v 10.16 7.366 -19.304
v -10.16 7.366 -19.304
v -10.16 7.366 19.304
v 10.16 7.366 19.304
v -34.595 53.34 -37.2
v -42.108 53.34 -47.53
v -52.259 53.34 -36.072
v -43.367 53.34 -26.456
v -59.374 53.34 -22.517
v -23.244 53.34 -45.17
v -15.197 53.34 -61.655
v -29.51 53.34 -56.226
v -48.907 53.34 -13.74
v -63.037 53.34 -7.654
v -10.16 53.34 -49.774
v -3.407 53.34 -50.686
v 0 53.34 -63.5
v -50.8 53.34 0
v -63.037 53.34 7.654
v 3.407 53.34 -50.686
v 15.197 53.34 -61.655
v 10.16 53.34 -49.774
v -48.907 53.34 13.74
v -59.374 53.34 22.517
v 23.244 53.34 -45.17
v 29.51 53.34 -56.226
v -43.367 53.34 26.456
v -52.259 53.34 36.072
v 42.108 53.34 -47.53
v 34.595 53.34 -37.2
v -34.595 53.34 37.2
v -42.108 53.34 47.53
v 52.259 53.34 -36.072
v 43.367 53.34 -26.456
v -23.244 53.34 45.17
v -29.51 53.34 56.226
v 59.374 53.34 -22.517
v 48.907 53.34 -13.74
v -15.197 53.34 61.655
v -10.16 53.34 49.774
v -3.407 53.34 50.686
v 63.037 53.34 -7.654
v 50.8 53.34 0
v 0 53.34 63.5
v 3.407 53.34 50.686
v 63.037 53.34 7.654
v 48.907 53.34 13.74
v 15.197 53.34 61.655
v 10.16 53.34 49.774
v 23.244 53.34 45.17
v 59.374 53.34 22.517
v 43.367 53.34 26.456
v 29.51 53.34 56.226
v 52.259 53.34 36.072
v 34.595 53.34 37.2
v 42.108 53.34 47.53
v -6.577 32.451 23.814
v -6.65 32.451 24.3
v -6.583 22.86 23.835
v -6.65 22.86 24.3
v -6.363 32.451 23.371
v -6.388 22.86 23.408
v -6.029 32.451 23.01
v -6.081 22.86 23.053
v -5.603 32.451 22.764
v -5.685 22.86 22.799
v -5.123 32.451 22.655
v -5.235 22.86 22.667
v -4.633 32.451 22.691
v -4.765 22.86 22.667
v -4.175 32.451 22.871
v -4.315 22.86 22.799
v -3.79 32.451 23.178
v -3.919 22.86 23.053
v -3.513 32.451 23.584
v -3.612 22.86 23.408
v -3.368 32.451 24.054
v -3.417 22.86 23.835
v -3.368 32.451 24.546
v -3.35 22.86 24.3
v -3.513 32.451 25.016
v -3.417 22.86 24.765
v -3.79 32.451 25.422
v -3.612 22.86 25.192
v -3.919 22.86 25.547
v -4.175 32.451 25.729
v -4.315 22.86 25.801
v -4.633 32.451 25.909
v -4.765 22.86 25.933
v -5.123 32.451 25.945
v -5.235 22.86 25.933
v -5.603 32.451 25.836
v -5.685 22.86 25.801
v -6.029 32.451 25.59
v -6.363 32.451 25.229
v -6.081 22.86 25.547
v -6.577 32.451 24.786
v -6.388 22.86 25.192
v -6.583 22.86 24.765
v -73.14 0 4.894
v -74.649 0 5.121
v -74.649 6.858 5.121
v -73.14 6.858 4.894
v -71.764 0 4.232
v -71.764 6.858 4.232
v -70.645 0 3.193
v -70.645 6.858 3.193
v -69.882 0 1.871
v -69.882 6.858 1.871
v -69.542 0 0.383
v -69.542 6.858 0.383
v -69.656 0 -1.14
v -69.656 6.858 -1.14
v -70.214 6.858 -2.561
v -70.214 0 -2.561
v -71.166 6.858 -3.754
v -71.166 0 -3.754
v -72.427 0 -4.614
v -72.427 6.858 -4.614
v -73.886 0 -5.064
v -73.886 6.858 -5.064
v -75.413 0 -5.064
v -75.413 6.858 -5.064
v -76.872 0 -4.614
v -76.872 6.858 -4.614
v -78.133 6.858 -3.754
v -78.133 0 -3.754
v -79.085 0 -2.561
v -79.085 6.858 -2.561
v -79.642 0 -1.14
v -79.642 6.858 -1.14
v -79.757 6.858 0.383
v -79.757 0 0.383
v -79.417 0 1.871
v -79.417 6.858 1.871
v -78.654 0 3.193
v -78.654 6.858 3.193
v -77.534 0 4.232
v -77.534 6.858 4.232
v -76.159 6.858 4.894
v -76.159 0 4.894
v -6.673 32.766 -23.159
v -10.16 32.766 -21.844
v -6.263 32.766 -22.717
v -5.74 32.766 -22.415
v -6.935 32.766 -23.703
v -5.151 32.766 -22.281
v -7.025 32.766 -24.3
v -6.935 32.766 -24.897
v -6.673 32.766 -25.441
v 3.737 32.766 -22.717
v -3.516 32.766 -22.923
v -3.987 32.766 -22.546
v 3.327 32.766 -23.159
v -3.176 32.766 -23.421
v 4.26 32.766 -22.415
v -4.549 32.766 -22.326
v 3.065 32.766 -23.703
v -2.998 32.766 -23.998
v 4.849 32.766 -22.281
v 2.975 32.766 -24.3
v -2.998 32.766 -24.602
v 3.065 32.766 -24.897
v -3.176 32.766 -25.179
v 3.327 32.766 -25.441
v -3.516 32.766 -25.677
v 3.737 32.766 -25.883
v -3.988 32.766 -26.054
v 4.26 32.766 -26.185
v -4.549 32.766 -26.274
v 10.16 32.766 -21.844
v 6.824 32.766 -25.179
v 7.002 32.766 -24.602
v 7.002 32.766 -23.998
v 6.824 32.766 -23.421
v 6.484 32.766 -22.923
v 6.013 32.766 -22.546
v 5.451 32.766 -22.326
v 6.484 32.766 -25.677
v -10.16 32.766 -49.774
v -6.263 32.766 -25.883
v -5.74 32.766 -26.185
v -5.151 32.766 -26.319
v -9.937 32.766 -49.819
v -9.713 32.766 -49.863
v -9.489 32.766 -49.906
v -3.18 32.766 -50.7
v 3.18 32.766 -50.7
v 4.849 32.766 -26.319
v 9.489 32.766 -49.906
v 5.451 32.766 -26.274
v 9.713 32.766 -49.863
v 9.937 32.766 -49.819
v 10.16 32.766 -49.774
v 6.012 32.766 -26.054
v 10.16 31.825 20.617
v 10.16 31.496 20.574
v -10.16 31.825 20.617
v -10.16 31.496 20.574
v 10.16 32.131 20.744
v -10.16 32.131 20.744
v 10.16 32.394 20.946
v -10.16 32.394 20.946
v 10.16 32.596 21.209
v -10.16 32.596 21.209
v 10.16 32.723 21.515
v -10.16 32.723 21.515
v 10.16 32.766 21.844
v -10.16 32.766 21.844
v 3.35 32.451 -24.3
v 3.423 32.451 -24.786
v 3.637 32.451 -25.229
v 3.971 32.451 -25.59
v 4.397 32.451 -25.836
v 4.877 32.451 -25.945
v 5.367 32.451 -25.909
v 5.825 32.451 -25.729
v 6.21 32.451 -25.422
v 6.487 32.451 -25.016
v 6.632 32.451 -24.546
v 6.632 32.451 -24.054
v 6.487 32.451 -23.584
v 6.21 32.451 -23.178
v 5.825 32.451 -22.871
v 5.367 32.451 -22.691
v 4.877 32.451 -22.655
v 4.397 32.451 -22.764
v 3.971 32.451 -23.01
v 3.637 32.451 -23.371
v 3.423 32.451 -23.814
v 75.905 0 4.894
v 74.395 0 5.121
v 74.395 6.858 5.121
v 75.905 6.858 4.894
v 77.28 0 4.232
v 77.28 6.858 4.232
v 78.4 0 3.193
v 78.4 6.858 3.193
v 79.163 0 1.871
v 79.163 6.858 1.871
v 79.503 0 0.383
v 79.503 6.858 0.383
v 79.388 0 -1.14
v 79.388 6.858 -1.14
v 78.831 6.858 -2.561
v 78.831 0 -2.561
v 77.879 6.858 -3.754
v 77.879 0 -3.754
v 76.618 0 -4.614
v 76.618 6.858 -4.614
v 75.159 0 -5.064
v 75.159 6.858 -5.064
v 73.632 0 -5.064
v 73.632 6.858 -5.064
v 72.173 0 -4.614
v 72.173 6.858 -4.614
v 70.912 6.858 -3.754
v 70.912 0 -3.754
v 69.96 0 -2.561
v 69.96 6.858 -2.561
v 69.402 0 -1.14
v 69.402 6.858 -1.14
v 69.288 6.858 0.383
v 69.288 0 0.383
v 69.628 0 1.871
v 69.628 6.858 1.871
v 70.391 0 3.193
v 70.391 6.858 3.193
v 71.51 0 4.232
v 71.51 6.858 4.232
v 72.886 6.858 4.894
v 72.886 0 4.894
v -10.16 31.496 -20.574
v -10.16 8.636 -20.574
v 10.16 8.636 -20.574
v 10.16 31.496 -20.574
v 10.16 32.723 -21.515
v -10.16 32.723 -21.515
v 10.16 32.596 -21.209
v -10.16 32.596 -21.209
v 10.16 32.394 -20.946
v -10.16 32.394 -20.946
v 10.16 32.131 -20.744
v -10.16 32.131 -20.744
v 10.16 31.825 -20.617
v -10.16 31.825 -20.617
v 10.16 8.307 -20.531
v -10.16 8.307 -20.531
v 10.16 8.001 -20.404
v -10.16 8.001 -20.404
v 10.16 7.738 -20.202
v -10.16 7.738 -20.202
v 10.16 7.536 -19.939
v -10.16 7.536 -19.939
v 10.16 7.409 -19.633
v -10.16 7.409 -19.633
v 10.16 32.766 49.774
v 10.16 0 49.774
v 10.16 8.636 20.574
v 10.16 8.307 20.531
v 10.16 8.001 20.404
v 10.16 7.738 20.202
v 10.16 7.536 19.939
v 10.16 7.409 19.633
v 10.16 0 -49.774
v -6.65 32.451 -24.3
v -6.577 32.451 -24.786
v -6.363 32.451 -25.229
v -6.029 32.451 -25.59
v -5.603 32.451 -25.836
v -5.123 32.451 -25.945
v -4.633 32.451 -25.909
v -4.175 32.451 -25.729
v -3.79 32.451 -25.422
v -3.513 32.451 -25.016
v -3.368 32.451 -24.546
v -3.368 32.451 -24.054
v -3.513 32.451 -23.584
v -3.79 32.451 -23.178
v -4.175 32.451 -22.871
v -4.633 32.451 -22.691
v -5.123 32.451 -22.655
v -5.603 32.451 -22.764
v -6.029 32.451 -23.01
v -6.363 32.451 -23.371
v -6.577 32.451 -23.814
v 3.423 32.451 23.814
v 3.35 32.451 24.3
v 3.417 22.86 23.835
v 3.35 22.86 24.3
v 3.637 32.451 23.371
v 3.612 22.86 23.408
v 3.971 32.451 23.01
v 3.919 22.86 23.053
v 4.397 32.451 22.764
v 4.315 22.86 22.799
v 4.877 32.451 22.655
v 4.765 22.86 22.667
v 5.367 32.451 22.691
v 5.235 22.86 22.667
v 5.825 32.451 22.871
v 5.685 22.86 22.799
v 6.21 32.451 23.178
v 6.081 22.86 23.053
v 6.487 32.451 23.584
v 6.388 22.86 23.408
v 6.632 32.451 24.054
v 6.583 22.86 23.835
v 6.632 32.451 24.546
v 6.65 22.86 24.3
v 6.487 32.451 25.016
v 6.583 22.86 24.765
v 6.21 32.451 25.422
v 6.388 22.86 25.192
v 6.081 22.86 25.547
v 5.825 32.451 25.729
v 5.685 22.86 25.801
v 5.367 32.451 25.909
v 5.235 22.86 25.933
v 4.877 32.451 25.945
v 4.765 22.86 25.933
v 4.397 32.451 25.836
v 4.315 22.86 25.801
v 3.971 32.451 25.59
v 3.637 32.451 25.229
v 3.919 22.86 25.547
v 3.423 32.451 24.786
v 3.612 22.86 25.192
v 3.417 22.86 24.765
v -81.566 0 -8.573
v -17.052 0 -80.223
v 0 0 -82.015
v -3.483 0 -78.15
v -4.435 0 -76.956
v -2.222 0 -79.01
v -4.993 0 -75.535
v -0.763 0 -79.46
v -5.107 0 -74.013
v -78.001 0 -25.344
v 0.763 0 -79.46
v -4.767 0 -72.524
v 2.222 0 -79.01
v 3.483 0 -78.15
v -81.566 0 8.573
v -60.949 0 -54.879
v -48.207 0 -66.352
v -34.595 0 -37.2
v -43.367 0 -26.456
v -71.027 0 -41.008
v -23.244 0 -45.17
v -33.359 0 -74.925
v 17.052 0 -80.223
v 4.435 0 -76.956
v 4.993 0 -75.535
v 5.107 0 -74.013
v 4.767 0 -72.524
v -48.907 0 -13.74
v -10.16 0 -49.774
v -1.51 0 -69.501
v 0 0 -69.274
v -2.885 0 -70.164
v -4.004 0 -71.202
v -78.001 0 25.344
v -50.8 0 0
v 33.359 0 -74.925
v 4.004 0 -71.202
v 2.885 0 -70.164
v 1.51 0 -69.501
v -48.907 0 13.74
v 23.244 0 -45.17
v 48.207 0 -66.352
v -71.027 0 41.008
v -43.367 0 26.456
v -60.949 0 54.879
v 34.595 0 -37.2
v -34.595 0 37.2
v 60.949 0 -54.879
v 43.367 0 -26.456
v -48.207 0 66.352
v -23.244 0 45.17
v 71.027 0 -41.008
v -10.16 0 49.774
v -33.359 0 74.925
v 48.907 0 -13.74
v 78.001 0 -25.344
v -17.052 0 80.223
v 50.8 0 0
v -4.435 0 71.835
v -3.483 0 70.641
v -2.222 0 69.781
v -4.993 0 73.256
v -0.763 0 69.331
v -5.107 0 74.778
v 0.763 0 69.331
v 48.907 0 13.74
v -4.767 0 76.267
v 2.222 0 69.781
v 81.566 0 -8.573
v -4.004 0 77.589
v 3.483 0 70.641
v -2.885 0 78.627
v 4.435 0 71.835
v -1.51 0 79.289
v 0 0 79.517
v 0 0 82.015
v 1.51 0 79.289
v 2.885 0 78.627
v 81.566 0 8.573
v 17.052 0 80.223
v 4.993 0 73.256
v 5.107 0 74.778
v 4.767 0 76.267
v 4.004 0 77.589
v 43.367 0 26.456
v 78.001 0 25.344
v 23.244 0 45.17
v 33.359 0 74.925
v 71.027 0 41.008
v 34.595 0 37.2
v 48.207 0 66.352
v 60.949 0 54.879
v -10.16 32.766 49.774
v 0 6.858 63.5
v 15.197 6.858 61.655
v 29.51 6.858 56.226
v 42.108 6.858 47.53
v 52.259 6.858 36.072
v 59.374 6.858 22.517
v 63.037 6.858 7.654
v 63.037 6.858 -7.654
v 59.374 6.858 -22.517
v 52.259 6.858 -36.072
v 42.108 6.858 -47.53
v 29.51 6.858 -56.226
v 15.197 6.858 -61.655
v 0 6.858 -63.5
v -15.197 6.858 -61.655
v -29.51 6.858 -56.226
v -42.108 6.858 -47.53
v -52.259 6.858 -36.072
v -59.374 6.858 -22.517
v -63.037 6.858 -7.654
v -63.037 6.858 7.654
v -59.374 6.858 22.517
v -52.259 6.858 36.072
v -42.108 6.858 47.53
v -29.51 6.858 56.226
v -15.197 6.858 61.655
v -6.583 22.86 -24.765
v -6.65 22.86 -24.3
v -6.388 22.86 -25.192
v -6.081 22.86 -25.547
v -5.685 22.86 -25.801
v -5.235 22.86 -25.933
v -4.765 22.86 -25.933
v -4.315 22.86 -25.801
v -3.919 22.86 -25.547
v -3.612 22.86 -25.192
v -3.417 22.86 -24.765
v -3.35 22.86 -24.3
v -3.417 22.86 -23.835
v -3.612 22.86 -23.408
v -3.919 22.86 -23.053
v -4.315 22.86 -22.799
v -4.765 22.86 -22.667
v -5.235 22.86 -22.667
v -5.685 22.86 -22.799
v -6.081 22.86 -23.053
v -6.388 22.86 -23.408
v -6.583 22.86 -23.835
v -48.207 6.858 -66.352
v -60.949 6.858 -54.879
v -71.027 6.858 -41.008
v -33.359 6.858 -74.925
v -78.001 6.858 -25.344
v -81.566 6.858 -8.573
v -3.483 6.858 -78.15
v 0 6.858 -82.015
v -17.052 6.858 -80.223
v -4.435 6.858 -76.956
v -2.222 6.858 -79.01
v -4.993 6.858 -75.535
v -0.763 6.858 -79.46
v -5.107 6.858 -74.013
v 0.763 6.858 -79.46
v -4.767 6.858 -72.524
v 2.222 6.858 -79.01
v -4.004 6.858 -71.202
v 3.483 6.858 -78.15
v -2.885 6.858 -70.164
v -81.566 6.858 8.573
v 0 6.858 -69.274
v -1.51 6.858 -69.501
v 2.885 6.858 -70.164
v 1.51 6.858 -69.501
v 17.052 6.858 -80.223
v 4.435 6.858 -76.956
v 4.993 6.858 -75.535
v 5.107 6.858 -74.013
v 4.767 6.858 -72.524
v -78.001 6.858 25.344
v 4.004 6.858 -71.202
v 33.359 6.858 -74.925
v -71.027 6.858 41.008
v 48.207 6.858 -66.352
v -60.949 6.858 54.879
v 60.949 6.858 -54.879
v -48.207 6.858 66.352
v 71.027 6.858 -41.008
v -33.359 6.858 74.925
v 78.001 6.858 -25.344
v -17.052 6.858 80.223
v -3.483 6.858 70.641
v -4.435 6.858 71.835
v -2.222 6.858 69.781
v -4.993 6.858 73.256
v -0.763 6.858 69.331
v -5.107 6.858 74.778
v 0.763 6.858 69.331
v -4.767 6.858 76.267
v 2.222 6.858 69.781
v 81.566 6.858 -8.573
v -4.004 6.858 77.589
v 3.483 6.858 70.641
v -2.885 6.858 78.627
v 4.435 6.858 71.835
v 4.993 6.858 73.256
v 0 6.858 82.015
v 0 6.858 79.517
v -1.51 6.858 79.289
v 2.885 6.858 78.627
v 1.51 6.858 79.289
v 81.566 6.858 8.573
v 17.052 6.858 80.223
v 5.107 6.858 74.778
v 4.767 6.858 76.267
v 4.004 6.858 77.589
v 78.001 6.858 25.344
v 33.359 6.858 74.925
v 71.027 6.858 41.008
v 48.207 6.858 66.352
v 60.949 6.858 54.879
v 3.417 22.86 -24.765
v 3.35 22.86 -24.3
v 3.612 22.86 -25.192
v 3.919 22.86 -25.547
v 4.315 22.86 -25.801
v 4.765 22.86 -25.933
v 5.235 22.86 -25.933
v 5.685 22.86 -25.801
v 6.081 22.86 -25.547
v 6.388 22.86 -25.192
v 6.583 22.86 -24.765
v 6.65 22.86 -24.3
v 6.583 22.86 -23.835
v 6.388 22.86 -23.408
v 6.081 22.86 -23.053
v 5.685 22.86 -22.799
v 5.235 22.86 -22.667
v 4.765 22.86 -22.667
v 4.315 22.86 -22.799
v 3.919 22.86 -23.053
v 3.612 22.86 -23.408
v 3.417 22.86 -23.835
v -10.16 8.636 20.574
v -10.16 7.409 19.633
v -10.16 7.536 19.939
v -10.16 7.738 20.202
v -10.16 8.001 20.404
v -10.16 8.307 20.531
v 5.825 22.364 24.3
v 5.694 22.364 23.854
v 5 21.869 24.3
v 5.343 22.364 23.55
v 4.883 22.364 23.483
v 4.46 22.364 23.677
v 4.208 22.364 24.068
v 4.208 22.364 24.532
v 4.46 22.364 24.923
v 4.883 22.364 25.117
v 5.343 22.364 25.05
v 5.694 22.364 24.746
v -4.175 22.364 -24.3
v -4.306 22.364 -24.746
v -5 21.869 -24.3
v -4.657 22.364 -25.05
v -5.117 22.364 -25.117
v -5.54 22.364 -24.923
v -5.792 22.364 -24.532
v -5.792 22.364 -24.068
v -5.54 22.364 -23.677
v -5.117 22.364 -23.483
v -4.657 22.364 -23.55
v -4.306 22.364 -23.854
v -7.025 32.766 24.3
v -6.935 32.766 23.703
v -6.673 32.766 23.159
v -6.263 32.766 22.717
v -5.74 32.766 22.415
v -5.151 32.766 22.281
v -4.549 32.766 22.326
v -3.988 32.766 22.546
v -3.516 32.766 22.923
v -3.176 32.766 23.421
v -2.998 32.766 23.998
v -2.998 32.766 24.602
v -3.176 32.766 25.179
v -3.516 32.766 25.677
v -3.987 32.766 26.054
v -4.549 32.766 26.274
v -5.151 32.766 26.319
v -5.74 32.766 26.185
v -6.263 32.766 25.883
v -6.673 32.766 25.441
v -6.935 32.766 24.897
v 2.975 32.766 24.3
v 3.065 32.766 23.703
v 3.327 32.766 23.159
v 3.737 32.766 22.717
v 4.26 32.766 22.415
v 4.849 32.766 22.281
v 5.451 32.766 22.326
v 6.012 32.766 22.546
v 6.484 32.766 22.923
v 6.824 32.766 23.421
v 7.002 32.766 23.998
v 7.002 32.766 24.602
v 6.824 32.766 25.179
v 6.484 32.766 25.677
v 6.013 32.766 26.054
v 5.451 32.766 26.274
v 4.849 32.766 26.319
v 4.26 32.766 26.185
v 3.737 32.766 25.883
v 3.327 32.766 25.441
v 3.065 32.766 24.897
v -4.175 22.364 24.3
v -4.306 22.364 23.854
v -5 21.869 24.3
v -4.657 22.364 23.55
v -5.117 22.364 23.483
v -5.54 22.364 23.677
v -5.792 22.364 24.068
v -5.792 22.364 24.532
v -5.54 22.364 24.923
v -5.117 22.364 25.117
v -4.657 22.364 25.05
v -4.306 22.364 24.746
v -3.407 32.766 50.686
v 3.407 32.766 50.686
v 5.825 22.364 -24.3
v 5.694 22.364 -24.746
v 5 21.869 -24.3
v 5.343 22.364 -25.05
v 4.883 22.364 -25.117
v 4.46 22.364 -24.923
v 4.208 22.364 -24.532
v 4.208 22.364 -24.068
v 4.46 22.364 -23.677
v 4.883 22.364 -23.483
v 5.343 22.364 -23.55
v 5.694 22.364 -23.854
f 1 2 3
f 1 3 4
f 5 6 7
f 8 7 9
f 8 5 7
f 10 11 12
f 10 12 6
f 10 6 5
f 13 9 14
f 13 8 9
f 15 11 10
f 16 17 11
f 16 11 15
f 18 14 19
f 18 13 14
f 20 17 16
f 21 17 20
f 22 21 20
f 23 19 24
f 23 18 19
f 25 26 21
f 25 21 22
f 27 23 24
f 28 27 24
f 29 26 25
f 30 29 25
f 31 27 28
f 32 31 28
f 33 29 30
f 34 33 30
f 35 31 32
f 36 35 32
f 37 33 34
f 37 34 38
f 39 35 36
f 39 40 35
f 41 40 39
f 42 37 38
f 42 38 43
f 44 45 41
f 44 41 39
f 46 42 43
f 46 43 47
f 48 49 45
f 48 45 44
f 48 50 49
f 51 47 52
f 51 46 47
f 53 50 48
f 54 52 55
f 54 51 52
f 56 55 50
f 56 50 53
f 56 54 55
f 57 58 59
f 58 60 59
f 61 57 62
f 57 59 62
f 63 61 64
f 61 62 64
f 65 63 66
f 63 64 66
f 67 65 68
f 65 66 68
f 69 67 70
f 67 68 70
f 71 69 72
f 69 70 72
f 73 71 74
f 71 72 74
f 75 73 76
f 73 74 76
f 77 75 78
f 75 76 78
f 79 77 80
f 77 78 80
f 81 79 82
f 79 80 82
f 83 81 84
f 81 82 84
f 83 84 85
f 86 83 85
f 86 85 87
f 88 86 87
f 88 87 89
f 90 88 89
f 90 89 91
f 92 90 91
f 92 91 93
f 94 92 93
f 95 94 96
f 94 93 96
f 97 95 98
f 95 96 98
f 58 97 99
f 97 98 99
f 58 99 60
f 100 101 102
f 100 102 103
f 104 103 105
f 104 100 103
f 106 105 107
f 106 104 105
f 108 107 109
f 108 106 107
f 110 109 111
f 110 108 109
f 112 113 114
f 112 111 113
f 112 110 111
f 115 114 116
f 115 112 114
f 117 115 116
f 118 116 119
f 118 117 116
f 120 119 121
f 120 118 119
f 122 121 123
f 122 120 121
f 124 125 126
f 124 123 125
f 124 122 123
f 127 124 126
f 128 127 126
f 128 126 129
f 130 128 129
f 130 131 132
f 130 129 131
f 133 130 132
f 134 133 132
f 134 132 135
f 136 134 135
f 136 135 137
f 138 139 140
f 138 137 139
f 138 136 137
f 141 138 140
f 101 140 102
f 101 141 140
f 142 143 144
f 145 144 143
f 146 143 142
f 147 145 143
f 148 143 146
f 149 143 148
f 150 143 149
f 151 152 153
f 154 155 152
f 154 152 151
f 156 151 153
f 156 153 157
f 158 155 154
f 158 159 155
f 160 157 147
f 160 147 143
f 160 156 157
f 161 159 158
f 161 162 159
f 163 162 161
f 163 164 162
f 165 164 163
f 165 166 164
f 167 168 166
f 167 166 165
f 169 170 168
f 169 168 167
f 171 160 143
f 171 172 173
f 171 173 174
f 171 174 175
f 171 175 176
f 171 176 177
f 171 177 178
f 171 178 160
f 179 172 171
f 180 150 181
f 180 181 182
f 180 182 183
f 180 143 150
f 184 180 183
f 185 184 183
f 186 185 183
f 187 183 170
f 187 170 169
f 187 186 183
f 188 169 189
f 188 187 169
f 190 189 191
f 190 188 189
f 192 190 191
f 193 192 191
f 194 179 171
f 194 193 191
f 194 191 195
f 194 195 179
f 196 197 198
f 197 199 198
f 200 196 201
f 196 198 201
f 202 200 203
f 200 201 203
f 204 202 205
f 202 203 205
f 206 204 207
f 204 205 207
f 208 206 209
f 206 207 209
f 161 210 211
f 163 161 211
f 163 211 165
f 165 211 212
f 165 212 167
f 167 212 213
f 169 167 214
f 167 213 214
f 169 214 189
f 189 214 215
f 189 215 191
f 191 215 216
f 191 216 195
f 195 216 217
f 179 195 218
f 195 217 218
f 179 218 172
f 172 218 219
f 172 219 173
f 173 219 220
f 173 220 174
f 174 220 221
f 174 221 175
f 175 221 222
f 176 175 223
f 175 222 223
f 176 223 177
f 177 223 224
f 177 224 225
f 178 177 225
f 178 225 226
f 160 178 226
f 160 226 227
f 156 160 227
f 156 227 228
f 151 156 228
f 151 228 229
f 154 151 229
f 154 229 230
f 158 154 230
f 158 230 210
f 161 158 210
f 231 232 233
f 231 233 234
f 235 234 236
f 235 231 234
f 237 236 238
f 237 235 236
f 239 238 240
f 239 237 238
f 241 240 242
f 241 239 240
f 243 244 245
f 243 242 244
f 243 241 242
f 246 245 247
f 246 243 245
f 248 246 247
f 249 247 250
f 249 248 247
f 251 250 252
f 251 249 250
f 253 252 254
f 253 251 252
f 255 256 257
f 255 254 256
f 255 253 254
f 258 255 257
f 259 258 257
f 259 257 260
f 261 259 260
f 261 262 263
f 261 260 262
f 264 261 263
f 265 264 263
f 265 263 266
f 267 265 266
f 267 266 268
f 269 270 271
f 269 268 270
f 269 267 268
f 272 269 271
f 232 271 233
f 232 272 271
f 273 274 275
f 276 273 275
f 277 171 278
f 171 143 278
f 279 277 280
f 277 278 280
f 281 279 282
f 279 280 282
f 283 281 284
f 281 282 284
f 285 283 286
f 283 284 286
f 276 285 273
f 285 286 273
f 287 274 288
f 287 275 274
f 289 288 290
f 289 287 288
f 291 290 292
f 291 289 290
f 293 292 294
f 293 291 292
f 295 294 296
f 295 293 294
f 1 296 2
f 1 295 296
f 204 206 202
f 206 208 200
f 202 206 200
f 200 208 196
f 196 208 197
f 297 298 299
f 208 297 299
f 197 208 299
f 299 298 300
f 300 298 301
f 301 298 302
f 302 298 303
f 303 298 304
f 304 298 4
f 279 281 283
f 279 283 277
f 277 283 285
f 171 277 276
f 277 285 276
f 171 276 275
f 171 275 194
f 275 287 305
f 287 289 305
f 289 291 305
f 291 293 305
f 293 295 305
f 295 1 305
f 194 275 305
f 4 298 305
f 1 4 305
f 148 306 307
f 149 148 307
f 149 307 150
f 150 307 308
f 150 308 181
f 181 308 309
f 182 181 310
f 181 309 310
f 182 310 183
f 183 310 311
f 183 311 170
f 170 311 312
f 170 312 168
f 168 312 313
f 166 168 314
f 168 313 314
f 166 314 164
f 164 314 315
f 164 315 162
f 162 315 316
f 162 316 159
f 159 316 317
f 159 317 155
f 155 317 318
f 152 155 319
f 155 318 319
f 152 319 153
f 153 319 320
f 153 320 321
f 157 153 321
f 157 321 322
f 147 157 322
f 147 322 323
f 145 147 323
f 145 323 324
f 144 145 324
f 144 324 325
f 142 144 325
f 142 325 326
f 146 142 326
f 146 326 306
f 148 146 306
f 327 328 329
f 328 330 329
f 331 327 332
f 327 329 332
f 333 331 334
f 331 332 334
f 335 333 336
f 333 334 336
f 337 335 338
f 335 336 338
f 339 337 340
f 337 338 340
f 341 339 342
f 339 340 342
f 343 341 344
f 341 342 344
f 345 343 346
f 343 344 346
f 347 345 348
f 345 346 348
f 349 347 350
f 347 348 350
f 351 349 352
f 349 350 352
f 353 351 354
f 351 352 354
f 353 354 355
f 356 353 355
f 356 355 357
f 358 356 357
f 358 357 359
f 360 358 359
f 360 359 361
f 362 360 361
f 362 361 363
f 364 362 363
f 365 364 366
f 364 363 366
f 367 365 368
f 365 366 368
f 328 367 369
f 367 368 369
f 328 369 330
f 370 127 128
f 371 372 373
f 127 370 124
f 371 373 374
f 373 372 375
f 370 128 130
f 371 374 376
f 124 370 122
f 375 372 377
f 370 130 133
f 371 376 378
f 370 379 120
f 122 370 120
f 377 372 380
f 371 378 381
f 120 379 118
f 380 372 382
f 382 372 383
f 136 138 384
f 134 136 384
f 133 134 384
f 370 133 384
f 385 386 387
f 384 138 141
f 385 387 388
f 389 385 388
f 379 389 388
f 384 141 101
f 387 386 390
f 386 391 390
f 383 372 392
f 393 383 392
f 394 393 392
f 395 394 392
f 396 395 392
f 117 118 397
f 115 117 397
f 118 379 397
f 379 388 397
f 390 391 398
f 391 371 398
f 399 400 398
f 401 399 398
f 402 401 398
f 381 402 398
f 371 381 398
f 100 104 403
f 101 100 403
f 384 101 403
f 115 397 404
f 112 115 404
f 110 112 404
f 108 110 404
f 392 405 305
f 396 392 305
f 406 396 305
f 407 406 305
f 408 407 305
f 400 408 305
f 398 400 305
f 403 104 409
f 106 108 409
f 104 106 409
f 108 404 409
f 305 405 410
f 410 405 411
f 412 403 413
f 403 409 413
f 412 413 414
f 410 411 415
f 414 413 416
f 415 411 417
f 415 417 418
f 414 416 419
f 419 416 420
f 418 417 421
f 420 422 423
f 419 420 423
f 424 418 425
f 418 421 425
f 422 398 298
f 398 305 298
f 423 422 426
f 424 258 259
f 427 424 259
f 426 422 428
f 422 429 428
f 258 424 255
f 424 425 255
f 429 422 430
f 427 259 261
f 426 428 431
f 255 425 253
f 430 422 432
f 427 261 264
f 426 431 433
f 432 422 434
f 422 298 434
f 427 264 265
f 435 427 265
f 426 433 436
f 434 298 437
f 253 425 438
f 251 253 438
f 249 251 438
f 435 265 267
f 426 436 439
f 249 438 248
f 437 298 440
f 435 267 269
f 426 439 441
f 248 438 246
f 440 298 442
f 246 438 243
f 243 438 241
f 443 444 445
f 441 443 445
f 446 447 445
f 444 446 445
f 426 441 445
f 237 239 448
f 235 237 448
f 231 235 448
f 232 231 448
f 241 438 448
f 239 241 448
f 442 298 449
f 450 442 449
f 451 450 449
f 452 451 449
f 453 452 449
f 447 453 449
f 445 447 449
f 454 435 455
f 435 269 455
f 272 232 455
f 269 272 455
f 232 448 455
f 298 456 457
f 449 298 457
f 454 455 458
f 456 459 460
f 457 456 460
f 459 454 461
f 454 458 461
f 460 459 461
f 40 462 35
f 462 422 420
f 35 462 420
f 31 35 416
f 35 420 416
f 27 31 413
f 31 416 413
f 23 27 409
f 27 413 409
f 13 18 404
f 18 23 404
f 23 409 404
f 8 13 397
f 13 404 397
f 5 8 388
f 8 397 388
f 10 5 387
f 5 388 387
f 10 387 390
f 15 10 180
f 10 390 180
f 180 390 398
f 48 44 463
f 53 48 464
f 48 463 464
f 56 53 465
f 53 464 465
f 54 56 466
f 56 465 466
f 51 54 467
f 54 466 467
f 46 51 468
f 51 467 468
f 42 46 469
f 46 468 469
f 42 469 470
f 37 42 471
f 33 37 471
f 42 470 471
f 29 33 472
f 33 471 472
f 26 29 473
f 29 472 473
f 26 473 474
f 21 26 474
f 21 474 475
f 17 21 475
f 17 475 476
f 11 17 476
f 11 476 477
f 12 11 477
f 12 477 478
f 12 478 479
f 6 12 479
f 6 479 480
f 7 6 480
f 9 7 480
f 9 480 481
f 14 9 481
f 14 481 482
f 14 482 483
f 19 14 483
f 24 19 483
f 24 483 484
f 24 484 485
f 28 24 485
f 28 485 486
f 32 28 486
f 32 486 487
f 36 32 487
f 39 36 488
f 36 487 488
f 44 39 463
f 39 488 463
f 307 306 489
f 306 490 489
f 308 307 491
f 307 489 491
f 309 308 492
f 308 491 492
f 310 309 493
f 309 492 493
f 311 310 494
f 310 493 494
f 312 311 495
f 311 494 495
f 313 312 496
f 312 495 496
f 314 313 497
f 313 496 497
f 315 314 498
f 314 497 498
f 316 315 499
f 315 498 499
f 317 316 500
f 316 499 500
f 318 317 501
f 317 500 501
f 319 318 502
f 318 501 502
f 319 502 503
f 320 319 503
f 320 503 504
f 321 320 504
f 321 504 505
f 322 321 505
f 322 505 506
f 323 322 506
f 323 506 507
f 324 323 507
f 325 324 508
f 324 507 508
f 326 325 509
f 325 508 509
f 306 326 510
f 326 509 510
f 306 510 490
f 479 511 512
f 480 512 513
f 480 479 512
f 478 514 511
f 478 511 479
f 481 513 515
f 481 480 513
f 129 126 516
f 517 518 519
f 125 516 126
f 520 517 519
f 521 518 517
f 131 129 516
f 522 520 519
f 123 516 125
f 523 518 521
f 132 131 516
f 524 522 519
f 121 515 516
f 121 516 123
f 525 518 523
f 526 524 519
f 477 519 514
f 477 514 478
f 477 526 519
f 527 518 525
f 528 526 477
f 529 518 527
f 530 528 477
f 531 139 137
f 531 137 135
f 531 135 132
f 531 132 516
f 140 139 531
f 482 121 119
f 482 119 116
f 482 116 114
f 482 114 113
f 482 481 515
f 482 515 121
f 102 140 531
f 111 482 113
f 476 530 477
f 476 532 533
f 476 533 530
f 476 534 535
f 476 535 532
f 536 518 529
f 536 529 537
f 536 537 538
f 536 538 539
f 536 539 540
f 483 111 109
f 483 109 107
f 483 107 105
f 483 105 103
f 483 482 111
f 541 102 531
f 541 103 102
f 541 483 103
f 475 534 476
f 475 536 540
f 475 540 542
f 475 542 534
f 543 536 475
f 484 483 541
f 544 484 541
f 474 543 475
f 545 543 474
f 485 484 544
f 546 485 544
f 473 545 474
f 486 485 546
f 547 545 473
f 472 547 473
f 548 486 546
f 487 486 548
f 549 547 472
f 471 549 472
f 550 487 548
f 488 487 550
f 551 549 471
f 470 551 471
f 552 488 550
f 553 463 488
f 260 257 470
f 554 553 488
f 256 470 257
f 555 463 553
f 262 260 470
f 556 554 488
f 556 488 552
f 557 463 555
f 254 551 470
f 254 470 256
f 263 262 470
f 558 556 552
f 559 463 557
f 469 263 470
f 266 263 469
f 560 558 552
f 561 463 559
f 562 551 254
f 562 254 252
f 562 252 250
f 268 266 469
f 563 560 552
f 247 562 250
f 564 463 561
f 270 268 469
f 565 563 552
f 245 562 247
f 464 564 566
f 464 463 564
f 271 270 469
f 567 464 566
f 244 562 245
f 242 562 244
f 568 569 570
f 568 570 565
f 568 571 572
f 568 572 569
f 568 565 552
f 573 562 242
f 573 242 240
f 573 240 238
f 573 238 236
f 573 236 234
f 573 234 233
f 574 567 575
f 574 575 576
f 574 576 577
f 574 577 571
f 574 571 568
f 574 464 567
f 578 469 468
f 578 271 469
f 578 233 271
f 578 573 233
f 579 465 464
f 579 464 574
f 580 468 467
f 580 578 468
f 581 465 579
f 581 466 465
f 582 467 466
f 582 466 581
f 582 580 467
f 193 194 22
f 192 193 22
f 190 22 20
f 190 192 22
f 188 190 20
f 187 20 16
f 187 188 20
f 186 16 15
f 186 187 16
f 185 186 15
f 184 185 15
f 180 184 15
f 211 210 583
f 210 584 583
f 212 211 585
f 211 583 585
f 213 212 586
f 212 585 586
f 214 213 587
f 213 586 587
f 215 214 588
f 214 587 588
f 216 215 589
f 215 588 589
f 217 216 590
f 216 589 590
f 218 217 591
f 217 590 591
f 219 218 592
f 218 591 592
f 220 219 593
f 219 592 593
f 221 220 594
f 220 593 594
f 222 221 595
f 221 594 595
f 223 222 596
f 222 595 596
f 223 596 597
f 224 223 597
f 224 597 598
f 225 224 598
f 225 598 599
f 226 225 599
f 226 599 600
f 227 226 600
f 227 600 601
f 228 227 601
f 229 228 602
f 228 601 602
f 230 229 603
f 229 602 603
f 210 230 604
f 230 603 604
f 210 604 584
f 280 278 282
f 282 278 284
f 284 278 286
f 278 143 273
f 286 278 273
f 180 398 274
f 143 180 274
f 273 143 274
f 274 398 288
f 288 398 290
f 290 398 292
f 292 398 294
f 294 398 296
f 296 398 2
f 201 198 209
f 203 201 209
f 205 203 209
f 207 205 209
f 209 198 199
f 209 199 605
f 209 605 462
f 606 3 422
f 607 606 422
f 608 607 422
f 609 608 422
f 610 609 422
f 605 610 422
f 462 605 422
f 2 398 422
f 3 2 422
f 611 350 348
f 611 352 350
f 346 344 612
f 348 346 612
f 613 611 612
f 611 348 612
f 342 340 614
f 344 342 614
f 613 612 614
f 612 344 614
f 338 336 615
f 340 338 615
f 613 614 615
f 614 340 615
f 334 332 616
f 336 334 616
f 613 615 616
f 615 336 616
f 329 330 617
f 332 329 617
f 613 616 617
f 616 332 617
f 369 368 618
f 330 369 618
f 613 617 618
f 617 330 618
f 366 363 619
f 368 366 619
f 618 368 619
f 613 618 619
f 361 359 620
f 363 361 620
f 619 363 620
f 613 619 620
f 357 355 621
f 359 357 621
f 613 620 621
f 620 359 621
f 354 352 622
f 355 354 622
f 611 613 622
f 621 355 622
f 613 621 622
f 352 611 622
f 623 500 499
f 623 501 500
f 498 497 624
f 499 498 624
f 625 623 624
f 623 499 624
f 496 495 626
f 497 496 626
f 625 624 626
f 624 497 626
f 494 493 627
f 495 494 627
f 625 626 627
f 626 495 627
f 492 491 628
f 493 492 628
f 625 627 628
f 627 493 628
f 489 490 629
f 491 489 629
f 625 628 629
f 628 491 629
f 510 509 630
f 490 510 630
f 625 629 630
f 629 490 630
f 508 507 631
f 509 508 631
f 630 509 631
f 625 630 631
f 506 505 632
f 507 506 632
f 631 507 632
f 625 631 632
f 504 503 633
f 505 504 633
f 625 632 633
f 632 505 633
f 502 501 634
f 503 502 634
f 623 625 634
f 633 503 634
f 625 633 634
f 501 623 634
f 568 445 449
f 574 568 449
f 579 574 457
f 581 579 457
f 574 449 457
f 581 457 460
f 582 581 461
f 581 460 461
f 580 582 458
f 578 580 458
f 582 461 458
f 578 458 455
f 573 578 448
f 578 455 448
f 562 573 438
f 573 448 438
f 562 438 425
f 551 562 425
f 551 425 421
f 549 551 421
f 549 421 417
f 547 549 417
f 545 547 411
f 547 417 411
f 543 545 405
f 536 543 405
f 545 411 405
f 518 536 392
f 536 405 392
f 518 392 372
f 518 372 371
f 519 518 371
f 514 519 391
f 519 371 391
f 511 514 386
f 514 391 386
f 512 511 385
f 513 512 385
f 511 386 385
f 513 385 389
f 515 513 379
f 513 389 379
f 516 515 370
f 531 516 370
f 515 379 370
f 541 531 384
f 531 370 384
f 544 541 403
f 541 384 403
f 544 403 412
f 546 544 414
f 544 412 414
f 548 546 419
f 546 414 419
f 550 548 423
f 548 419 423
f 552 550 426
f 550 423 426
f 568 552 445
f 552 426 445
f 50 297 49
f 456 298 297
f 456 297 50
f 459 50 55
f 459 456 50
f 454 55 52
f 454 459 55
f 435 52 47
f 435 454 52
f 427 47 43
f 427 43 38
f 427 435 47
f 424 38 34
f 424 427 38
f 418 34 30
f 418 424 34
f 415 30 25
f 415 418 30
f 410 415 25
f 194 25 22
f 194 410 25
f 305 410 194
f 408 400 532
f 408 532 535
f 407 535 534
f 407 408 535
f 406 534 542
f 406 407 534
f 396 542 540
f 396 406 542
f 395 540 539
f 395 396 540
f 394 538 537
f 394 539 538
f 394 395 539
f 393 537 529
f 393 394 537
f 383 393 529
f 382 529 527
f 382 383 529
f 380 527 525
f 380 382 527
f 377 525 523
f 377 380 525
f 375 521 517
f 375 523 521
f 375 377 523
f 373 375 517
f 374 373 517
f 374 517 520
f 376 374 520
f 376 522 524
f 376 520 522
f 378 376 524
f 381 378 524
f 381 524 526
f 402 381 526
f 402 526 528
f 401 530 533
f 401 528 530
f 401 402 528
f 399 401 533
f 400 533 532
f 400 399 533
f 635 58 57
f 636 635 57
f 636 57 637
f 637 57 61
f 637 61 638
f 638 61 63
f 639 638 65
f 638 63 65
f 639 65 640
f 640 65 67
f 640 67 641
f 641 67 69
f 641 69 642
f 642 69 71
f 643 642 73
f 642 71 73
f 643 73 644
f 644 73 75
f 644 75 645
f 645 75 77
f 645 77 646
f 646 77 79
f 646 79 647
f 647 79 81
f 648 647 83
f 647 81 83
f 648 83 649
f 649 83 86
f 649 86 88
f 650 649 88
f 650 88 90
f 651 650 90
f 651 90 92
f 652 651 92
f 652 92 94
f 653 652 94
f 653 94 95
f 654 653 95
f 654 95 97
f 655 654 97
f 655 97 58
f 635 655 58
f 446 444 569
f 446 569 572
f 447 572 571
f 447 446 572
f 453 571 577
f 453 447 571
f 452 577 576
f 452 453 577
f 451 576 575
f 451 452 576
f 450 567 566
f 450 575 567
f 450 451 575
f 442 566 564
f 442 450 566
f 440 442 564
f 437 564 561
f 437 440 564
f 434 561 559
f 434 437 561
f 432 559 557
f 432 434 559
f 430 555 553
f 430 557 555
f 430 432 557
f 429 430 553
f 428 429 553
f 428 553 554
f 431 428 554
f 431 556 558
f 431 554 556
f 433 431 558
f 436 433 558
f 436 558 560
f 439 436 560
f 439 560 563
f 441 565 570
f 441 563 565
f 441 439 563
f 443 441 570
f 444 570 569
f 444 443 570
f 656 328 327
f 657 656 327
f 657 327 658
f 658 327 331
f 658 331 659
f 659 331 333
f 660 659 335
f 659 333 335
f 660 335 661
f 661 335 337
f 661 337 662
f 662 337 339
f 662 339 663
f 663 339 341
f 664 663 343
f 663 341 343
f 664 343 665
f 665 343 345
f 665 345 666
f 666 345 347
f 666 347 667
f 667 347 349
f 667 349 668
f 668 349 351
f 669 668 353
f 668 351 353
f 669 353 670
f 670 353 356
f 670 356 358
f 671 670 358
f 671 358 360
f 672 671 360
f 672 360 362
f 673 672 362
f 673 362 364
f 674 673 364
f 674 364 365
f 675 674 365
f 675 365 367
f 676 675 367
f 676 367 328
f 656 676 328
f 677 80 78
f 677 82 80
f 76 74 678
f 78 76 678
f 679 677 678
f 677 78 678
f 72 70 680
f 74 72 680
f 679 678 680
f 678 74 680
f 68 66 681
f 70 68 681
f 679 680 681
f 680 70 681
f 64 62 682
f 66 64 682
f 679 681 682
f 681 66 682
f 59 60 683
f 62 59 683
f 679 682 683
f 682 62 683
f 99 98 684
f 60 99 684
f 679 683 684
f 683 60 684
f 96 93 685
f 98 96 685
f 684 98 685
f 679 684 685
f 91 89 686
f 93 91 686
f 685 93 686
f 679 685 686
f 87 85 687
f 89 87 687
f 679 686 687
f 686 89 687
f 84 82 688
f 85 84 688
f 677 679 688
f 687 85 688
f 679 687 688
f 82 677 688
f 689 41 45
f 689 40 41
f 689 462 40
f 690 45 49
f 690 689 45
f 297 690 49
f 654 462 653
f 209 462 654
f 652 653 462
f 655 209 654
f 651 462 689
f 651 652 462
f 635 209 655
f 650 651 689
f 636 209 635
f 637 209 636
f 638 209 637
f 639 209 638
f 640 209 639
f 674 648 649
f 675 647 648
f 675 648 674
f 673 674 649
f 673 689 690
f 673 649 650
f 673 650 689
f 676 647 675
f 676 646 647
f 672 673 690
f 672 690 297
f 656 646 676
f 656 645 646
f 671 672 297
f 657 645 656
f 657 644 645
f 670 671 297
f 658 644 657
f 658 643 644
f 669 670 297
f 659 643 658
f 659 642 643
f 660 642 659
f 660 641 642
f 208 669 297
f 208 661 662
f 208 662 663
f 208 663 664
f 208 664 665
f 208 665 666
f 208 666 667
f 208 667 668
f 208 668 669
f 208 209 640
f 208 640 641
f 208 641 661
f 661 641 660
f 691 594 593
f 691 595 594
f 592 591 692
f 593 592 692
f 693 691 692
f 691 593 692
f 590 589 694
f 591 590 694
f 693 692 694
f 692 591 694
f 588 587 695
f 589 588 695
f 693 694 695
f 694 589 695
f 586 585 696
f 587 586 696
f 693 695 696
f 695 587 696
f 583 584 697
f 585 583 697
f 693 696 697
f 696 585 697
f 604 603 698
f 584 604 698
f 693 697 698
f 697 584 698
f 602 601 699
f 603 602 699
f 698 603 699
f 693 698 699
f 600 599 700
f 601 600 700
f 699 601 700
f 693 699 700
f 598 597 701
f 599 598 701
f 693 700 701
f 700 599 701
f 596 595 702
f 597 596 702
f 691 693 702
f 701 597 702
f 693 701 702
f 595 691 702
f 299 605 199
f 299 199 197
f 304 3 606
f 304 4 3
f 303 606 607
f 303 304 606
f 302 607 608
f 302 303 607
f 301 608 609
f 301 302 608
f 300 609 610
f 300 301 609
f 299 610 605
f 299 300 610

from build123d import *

# Parameters (mm, degrees)
SKETCH2_R                       = 63.5
SKETCH2_R_2                     = 50.8
BOSS_EXTRUDE1_DEPTH             = 53.34
SKETCH4_R                       = 82.015423661
BOSS_EXTRUDE3_DEPTH             = 6.858
CUT_EXTRUDE2_DEPTH              = 125.954534773
CUT_EXTRUDE2_DEPTH_BACK         = 125.954534773
SKETCH6_R                       = 5.121456342
CUT_EXTRUDE3_DEPTH              = 125.954534773
CUT_EXTRUDE3_DEPTH_BACK         = 125.954534773
SKETCH9_W                       = 20.32
SKETCH9_H                       = 38.475908221
BOSS_EXTRUDE4_DEPTH             = 25.908
CUT_EXTRUDE5_DEPTH              = 121.526636859
CUT_EXTRUDE5_DEPTH_BACK         = 25.4
SKETCH11_W                      = 20.32
SKETCH11_H                      = 41.148
FILLET1_R                       = 1.27
M4X0_7_TAPPED_HOLE3_D           = 3.3
M4X0_7_TAPPED_HOLE3_DEPTH       = 9.906
M4X0_7_TAPPED_HOLE3_CSINK_D     = 4.05
M4X0_7_TAPPED_HOLE3_CSINK_ANGLE = 100
M4X0_7_TAPPED_HOLE3_TIP         = 0.991420021


with BuildPart() as part:
    # Sketch2 → Boss-Extrude1 (new body)
    with BuildSketch(Plane(origin=(0, 0, 0), x_dir=(1, 0, 0), z_dir=(0, 1, 0))):
        with Locations(Location((0, 0, 0), (0, 0, 270))):
            Circle(SKETCH2_R)
        with Locations(Location((0, 0, 0), (0, 0, 270))):
            Circle(SKETCH2_R_2, mode=Mode.SUBTRACT)
    extrude(amount=BOSS_EXTRUDE1_DEPTH)

    # Sketch4 → Boss-Extrude3 (add)
    with BuildSketch(Plane(origin=(0, 0, 0), x_dir=(1, 0, 0), z_dir=(0, 1, 0))):
        with Locations(Location((0, 0, 0), (0, 0, 270))):
            Circle(SKETCH4_R)
    extrude(amount=BOSS_EXTRUDE3_DEPTH)

    # Sketch6 → Cut-Extrude2 (cut, two sides: drawn at the far end of the back side and taken through both)
    with BuildSketch(Plane(origin=(0, 6.858, 0), x_dir=(1, 0, 0), z_dir=(0, 1, 0)).offset(-CUT_EXTRUDE2_DEPTH_BACK)):
        with Locations(Location((0, 74.395423661, 0), (0, 0, 270))):
            Circle(SKETCH6_R)
        with Locations(Location((-74.649423661, 0, 0), (0, 0, 270))):
            Circle(SKETCH6_R)
        with Locations(Location((74.395423661, 0, 0), (0, 0, 270))):
            Circle(SKETCH6_R)
        with Locations(Location((0, -74.395423661, 0), (0, 0, 270))):
            Circle(SKETCH6_R)
    extrude(amount=CUT_EXTRUDE2_DEPTH + CUT_EXTRUDE2_DEPTH_BACK, mode=Mode.SUBTRACT)

    # Sketch8 → Cut-Extrude3 (cut, two sides: drawn at the far end of the back side and taken through both)
    with BuildSketch(Plane(origin=(0, 6.858, 0), x_dir=(1, 0, 0), z_dir=(0, 1, 0)).offset(-CUT_EXTRUDE3_DEPTH_BACK)):
        with BuildLine():
            Line((-10.16, 49.773631573), (-10.16, -49.773631573))
            ThreePointArc((-10.16, -49.773631573), (-50.8, 0), (-10.16, 49.773631573))
        make_face()
        with BuildLine():
            Line((10.16, 49.773631573), (10.16, -49.773631573))
            ThreePointArc((10.16, -49.773631573), (50.8, 0), (10.16, 49.773631573))
        make_face()
    extrude(amount=CUT_EXTRUDE3_DEPTH + CUT_EXTRUDE3_DEPTH_BACK, mode=Mode.SUBTRACT)

    # Sketch9 → Boss-Extrude4 (add)
    with BuildSketch(Plane(origin=(0, 6.858, 0), x_dir=(1, 0, 0), z_dir=(0, 1, 0))):
        with Locations((0, 30.667954111)):
            Rectangle(SKETCH9_W, SKETCH9_H)
        with BuildLine():
            Line((-10.16, 49.773631573), (-10.16, -49.773631573))
            ThreePointArc((-10.16, -49.773631573), (0, -50.8), (10.16, -49.773631573))
            Line((10.16, -49.773631573), (10.16, 49.773631573))
            ThreePointArc((10.16, 49.773631573), (0, 50.8), (-10.16, 49.773631573))
        make_face()
    extrude(amount=BOSS_EXTRUDE4_DEPTH)

    # Sketch11 → Cut-Extrude5 (cut, two sides: drawn at the far end of the back side and taken through both)
    with BuildSketch(Plane(origin=(0, 32.766, 0), x_dir=(1, 0, 0), z_dir=(0, 1, 0)).offset(-CUT_EXTRUDE5_DEPTH_BACK)):
        Rectangle(SKETCH11_W, SKETCH11_H)
    extrude(amount=CUT_EXTRUDE5_DEPTH + CUT_EXTRUDE5_DEPTH_BACK, mode=Mode.SUBTRACT)

    # Fillet1
    fillet1_edges = [part.edges().sort_by_distance(p)[0] for p in [
        (0, 32.766, 20.574),
        (0, 7.366, 20.574),
        (0, 7.366, -20.574),
        (0, 32.766, -20.574),
    ]]
    fillet(fillet1_edges, radius=FILLET1_R)

    # M4x0.7 Tapped Hole3
    with Locations(Plane(origin=(0, 32.766, 0), x_dir=(1, 0, 0), z_dir=(0, 1, 0))):
        with Locations((5, -24.3), (-5, -24.3), (5, 24.3), (-5, 24.3)):
            CounterSinkHole(M4X0_7_TAPPED_HOLE3_D / 2, M4X0_7_TAPPED_HOLE3_CSINK_D / 2, depth=M4X0_7_TAPPED_HOLE3_DEPTH, counter_sink_angle=M4X0_7_TAPPED_HOLE3_CSINK_ANGLE)
            with Locations((0, 0, -(M4X0_7_TAPPED_HOLE3_DEPTH + M4X0_7_TAPPED_HOLE3_TIP / 2))):  # 118° drill point
                Cone(0, M4X0_7_TAPPED_HOLE3_D / 2, M4X0_7_TAPPED_HOLE3_TIP, mode=Mode.SUBTRACT)


solid = part.part
